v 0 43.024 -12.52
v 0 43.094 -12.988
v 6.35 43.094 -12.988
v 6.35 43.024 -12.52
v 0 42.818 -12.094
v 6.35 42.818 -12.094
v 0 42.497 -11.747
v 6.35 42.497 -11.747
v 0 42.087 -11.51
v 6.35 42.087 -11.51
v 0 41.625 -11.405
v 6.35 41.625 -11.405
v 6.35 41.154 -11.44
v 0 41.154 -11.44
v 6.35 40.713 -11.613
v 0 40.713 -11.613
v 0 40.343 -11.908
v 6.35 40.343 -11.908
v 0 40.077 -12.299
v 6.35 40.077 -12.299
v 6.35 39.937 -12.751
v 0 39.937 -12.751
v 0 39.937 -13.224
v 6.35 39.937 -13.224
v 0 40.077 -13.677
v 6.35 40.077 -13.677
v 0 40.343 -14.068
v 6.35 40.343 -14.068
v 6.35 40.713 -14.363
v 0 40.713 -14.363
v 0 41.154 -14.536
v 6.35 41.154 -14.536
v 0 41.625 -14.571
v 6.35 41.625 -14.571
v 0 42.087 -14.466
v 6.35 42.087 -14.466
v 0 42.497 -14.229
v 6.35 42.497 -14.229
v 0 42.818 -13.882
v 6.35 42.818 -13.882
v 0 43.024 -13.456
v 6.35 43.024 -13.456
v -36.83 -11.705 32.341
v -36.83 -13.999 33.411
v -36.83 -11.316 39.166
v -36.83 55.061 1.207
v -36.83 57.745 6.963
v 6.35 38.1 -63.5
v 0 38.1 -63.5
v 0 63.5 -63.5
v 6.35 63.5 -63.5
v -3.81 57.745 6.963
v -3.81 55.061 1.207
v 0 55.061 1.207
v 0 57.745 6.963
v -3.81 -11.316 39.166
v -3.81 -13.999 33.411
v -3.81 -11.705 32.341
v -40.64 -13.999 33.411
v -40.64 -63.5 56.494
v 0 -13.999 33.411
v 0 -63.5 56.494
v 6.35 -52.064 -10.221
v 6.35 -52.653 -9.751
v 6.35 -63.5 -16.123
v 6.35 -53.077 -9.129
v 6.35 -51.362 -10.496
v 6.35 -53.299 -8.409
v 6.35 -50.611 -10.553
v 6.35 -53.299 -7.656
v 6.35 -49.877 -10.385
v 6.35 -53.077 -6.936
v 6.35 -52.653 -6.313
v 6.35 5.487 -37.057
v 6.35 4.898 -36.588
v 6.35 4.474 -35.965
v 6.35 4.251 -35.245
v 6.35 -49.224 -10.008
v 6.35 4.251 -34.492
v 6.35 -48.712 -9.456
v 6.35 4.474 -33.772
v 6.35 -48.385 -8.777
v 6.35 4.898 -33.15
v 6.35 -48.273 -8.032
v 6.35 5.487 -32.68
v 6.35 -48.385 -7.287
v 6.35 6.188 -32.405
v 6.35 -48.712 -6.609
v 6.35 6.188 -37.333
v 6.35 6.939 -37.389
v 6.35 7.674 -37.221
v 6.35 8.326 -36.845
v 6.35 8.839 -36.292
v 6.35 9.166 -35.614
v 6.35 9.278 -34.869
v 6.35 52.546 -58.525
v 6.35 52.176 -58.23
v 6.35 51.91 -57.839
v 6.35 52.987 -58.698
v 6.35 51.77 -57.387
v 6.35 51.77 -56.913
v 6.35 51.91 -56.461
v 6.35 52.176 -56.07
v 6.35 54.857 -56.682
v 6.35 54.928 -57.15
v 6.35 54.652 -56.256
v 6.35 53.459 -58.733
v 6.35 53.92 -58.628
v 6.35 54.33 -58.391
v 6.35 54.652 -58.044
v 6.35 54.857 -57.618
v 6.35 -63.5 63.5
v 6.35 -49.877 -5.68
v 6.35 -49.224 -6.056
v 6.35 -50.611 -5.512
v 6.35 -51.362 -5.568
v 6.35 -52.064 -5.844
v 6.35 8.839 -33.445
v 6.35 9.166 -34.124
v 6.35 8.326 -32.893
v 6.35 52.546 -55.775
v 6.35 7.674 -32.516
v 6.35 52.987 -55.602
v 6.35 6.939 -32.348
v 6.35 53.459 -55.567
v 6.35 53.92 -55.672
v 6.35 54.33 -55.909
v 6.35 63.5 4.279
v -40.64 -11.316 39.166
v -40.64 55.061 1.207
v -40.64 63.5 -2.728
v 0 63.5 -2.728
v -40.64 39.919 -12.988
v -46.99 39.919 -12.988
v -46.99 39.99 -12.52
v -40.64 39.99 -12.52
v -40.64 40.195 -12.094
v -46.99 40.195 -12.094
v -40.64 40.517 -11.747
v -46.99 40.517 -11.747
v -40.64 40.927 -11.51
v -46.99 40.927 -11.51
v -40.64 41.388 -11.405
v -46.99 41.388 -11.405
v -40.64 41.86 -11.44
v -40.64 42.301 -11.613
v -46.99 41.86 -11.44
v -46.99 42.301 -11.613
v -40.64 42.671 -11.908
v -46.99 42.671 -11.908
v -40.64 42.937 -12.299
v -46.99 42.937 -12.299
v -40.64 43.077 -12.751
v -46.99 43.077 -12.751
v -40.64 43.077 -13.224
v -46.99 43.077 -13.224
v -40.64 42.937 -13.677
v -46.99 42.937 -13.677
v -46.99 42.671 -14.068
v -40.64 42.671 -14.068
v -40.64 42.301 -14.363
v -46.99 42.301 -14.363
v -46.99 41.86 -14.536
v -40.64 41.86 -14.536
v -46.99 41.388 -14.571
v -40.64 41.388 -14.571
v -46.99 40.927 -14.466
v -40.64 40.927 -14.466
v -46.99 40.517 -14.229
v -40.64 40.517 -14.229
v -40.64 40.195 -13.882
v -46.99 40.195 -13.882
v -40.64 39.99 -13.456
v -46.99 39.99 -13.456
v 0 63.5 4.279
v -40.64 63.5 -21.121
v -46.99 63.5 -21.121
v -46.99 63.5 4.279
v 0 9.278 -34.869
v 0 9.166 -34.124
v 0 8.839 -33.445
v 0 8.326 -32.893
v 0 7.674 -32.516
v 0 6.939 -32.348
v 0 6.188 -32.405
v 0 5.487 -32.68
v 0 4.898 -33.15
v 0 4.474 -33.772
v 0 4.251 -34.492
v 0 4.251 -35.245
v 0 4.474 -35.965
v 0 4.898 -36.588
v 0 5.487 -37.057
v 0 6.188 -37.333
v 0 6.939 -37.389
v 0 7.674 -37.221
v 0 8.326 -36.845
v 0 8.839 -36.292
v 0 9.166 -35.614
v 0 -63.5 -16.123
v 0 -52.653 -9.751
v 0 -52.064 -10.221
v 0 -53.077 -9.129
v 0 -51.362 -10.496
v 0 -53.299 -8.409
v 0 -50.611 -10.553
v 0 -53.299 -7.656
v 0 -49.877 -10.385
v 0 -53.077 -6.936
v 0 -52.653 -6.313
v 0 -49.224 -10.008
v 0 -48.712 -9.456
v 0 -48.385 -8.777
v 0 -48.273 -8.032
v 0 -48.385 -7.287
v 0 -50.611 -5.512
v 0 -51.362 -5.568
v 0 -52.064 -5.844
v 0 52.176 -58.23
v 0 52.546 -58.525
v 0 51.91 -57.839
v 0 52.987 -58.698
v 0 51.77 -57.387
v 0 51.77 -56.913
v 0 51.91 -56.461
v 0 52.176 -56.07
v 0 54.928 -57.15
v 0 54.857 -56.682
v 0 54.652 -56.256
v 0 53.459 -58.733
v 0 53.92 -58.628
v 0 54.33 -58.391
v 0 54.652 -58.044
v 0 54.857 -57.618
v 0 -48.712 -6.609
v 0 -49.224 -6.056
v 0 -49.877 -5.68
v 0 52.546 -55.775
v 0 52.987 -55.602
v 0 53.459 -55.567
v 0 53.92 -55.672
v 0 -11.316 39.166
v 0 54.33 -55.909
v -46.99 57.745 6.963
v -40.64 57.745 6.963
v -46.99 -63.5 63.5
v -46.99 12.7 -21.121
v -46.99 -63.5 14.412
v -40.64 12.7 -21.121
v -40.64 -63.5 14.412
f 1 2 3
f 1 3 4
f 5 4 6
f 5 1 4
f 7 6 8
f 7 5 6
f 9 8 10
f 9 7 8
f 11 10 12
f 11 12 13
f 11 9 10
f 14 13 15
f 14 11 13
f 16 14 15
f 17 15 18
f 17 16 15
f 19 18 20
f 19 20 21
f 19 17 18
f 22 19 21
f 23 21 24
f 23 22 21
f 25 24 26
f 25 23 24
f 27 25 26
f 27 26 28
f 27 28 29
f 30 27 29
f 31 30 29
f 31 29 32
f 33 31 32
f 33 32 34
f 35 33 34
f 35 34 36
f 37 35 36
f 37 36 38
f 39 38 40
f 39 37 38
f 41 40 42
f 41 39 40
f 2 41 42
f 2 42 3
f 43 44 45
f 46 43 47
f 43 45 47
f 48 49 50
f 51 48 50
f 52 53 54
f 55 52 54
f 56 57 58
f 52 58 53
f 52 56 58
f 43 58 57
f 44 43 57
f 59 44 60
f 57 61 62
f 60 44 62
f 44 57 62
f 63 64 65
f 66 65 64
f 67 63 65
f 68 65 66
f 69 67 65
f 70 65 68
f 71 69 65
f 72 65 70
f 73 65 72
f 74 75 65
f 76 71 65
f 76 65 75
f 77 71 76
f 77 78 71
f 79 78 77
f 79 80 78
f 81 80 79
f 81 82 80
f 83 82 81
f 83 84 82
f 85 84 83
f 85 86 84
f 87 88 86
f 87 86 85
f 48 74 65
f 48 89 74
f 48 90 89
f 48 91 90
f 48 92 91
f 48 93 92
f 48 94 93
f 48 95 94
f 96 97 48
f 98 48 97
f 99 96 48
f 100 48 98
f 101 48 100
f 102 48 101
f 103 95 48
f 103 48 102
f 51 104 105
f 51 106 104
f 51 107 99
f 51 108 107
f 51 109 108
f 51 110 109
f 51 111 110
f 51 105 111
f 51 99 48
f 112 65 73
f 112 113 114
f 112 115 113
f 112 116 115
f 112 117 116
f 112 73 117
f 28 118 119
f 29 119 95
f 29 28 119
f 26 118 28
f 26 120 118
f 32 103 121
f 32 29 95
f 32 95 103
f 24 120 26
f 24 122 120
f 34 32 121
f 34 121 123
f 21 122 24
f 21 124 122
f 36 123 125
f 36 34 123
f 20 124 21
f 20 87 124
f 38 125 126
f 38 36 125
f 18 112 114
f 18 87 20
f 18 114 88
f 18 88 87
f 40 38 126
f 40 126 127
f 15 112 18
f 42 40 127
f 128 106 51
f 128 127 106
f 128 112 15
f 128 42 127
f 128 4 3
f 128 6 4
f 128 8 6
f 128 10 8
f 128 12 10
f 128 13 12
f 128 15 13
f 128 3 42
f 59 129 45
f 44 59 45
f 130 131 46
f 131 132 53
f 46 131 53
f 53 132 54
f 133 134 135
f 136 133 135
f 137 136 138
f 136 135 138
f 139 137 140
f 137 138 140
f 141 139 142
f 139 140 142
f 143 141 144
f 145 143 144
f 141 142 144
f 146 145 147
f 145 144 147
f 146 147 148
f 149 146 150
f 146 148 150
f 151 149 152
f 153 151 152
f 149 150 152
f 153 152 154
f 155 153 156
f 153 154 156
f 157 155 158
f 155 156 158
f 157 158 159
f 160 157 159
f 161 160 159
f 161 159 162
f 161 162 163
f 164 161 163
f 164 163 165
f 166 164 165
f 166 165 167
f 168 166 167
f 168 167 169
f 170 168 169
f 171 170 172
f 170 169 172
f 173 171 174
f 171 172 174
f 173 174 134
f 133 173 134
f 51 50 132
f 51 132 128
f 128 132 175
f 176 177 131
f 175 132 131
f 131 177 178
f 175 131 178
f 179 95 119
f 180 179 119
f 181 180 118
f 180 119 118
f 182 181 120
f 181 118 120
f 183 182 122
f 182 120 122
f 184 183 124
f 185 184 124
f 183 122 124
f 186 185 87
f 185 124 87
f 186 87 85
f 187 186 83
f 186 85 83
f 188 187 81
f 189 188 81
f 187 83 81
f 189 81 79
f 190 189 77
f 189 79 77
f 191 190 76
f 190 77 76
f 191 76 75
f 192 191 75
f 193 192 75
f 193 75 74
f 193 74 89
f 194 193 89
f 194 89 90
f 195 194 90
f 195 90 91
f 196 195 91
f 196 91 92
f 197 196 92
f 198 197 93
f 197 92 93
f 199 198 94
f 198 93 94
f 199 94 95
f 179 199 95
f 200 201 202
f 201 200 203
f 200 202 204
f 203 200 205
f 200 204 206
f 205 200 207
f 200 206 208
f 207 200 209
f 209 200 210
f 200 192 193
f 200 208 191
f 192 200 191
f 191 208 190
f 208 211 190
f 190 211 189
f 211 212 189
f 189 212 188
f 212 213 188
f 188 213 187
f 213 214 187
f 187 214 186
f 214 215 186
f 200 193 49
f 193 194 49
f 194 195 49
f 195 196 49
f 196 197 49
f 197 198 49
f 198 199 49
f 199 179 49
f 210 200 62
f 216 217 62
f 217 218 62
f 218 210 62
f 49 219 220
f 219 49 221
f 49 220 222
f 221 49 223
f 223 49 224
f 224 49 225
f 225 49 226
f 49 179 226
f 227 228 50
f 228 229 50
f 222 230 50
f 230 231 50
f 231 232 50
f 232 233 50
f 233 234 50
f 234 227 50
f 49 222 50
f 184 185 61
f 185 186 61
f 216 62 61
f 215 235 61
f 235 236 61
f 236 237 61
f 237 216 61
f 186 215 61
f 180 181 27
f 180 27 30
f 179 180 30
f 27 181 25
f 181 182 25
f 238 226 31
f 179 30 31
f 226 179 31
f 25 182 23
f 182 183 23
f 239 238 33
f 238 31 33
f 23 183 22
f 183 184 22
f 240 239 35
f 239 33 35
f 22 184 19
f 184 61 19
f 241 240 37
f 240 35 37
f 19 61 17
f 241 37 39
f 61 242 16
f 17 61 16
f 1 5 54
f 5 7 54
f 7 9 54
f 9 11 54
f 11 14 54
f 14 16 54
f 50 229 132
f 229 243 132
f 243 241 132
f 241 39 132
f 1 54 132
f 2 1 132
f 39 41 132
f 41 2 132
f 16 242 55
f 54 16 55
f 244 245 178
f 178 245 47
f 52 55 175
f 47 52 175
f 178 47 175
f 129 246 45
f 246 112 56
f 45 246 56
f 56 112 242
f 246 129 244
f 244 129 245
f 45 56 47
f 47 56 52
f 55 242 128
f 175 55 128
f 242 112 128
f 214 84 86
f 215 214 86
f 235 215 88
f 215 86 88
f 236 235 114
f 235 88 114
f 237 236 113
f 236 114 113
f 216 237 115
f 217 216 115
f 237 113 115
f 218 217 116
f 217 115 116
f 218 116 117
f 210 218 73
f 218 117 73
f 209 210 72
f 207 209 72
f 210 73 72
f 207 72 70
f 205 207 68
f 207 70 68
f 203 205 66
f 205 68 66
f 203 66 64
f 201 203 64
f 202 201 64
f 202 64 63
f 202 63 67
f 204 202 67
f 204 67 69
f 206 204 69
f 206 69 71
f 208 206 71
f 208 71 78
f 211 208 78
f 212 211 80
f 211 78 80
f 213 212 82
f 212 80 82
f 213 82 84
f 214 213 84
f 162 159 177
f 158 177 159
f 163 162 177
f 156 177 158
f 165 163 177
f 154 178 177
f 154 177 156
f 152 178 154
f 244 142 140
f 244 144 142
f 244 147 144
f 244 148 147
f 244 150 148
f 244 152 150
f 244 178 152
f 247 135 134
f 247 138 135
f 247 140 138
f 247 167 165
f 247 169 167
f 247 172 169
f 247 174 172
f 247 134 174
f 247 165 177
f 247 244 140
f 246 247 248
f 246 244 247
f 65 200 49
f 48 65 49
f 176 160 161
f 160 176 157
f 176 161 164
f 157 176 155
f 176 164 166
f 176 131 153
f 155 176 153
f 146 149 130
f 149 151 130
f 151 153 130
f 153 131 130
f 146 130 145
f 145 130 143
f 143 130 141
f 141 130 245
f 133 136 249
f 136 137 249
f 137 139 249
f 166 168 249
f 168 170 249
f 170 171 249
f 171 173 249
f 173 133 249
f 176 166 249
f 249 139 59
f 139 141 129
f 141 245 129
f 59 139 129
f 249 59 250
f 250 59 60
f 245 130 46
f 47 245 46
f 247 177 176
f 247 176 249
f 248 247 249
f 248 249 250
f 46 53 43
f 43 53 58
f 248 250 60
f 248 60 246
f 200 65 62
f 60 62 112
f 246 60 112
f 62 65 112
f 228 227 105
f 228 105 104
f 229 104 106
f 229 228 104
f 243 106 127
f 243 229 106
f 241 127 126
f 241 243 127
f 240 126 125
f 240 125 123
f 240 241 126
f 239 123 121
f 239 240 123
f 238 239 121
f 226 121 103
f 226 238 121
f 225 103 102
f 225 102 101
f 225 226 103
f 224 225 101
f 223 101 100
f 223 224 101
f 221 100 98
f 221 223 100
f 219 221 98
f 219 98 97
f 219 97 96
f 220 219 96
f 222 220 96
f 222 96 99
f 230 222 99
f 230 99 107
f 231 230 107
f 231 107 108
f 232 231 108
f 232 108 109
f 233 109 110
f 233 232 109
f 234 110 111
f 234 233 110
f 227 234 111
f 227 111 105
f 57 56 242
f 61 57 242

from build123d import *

# Parameters (mm, degrees)
F0_R     = 1.5875
F1_DEPTH = 6.35
F3_DEPTH = 46.99
F4_R     = 1.5875
F5_DEPTH = 6.35
F6_W     = 3.81
F6_H     = 76.2
F7_DEPTH = 6.35
F8_R     = 2.5273
F9_DEPTH = 6.35


with BuildPart() as f1:
    # F0 (on Right) → F1 (new body)
    with BuildSketch(Plane.YZ):
        Polygon((63.5, -63.5), (63.5, 4.2789274143), (-63.5, 63.5), (-63.5, -16.1231419315), (38.1, -63.5), align=None)
        with Locations((53.34, -57.15)):
            Circle(F0_R, mode=Mode.SUBTRACT)
        with Locations((41.5067932579, -12.9878712221)):
            Circle(F0_R, mode=Mode.SUBTRACT)
    extrude(amount=F1_DEPTH)

    # F2 (on face) → F3 (join)
    with BuildSketch(Plane(origin=(0, 0, 0), x_dir=(0, -1, 0), z_dir=(-1, 0, 0))):
        Polygon((11.7045099709, 32.3409165561), (63.5, 56.4935502146), (63.5, 63.5), (9.0208840088, 38.0959710038), align=None)
        Polygon((-63.5, -2.7275223711), (-55.0613195903, 1.2074989287), (-57.7449455523, 6.9625533764), (-63.5, 4.2789274143), align=None)
        Polygon((-55.0613195903, 1.2074989287), (11.7045099709, 32.3409165561), (9.0208840088, 38.0959710038), (-57.7449455523, 6.9625533764), align=None)
    extrude(amount=F3_DEPTH)

    # F4 (on face) → F5 (join)
    with BuildSketch(Plane(origin=(-46.99, 0, 0), x_dir=(0, -1, 0), z_dir=(-1, 0, 0))):
        Polygon((63.5, 63.5), (-63.5, 4.2789274143), (-63.5, -21.1210725857), (-12.7, -21.1210725857), (63.5, 14.4115709657), align=None)
        with Locations((-41.5067932579, -12.9878712221)):
            Circle(F4_R, mode=Mode.SUBTRACT)
    extrude(amount=-F5_DEPTH)

    # F6 (on face) → F7 (cut, through all)
    with BuildSketch(Plane(origin=(0, 12.9804176766, 27.8365955385), x_dir=(1, 0, 0), z_dir=(0, 0.4226182617, 0.906307787))):
        with Locations((-1.905, 11.2921916109)):
            Rectangle(F6_W, F6_H)
        with Locations((-38.735, 11.2921916109)):
            Rectangle(F6_W, F6_H)
    extrude(amount=-F7_DEPTH, mode=Mode.SUBTRACT)

    # F8 (on face) → F9 (cut, through all)
    with BuildSketch(Plane.YZ.offset(6.35)):
        with Locations((-50.8, -8.0323496192)):
            Circle(F8_R)
        with Locations((6.7505444768, -34.8686092397)):
            Circle(F8_R)
    extrude(amount=-F9_DEPTH, mode=Mode.SUBTRACT)


solid = f1.part
